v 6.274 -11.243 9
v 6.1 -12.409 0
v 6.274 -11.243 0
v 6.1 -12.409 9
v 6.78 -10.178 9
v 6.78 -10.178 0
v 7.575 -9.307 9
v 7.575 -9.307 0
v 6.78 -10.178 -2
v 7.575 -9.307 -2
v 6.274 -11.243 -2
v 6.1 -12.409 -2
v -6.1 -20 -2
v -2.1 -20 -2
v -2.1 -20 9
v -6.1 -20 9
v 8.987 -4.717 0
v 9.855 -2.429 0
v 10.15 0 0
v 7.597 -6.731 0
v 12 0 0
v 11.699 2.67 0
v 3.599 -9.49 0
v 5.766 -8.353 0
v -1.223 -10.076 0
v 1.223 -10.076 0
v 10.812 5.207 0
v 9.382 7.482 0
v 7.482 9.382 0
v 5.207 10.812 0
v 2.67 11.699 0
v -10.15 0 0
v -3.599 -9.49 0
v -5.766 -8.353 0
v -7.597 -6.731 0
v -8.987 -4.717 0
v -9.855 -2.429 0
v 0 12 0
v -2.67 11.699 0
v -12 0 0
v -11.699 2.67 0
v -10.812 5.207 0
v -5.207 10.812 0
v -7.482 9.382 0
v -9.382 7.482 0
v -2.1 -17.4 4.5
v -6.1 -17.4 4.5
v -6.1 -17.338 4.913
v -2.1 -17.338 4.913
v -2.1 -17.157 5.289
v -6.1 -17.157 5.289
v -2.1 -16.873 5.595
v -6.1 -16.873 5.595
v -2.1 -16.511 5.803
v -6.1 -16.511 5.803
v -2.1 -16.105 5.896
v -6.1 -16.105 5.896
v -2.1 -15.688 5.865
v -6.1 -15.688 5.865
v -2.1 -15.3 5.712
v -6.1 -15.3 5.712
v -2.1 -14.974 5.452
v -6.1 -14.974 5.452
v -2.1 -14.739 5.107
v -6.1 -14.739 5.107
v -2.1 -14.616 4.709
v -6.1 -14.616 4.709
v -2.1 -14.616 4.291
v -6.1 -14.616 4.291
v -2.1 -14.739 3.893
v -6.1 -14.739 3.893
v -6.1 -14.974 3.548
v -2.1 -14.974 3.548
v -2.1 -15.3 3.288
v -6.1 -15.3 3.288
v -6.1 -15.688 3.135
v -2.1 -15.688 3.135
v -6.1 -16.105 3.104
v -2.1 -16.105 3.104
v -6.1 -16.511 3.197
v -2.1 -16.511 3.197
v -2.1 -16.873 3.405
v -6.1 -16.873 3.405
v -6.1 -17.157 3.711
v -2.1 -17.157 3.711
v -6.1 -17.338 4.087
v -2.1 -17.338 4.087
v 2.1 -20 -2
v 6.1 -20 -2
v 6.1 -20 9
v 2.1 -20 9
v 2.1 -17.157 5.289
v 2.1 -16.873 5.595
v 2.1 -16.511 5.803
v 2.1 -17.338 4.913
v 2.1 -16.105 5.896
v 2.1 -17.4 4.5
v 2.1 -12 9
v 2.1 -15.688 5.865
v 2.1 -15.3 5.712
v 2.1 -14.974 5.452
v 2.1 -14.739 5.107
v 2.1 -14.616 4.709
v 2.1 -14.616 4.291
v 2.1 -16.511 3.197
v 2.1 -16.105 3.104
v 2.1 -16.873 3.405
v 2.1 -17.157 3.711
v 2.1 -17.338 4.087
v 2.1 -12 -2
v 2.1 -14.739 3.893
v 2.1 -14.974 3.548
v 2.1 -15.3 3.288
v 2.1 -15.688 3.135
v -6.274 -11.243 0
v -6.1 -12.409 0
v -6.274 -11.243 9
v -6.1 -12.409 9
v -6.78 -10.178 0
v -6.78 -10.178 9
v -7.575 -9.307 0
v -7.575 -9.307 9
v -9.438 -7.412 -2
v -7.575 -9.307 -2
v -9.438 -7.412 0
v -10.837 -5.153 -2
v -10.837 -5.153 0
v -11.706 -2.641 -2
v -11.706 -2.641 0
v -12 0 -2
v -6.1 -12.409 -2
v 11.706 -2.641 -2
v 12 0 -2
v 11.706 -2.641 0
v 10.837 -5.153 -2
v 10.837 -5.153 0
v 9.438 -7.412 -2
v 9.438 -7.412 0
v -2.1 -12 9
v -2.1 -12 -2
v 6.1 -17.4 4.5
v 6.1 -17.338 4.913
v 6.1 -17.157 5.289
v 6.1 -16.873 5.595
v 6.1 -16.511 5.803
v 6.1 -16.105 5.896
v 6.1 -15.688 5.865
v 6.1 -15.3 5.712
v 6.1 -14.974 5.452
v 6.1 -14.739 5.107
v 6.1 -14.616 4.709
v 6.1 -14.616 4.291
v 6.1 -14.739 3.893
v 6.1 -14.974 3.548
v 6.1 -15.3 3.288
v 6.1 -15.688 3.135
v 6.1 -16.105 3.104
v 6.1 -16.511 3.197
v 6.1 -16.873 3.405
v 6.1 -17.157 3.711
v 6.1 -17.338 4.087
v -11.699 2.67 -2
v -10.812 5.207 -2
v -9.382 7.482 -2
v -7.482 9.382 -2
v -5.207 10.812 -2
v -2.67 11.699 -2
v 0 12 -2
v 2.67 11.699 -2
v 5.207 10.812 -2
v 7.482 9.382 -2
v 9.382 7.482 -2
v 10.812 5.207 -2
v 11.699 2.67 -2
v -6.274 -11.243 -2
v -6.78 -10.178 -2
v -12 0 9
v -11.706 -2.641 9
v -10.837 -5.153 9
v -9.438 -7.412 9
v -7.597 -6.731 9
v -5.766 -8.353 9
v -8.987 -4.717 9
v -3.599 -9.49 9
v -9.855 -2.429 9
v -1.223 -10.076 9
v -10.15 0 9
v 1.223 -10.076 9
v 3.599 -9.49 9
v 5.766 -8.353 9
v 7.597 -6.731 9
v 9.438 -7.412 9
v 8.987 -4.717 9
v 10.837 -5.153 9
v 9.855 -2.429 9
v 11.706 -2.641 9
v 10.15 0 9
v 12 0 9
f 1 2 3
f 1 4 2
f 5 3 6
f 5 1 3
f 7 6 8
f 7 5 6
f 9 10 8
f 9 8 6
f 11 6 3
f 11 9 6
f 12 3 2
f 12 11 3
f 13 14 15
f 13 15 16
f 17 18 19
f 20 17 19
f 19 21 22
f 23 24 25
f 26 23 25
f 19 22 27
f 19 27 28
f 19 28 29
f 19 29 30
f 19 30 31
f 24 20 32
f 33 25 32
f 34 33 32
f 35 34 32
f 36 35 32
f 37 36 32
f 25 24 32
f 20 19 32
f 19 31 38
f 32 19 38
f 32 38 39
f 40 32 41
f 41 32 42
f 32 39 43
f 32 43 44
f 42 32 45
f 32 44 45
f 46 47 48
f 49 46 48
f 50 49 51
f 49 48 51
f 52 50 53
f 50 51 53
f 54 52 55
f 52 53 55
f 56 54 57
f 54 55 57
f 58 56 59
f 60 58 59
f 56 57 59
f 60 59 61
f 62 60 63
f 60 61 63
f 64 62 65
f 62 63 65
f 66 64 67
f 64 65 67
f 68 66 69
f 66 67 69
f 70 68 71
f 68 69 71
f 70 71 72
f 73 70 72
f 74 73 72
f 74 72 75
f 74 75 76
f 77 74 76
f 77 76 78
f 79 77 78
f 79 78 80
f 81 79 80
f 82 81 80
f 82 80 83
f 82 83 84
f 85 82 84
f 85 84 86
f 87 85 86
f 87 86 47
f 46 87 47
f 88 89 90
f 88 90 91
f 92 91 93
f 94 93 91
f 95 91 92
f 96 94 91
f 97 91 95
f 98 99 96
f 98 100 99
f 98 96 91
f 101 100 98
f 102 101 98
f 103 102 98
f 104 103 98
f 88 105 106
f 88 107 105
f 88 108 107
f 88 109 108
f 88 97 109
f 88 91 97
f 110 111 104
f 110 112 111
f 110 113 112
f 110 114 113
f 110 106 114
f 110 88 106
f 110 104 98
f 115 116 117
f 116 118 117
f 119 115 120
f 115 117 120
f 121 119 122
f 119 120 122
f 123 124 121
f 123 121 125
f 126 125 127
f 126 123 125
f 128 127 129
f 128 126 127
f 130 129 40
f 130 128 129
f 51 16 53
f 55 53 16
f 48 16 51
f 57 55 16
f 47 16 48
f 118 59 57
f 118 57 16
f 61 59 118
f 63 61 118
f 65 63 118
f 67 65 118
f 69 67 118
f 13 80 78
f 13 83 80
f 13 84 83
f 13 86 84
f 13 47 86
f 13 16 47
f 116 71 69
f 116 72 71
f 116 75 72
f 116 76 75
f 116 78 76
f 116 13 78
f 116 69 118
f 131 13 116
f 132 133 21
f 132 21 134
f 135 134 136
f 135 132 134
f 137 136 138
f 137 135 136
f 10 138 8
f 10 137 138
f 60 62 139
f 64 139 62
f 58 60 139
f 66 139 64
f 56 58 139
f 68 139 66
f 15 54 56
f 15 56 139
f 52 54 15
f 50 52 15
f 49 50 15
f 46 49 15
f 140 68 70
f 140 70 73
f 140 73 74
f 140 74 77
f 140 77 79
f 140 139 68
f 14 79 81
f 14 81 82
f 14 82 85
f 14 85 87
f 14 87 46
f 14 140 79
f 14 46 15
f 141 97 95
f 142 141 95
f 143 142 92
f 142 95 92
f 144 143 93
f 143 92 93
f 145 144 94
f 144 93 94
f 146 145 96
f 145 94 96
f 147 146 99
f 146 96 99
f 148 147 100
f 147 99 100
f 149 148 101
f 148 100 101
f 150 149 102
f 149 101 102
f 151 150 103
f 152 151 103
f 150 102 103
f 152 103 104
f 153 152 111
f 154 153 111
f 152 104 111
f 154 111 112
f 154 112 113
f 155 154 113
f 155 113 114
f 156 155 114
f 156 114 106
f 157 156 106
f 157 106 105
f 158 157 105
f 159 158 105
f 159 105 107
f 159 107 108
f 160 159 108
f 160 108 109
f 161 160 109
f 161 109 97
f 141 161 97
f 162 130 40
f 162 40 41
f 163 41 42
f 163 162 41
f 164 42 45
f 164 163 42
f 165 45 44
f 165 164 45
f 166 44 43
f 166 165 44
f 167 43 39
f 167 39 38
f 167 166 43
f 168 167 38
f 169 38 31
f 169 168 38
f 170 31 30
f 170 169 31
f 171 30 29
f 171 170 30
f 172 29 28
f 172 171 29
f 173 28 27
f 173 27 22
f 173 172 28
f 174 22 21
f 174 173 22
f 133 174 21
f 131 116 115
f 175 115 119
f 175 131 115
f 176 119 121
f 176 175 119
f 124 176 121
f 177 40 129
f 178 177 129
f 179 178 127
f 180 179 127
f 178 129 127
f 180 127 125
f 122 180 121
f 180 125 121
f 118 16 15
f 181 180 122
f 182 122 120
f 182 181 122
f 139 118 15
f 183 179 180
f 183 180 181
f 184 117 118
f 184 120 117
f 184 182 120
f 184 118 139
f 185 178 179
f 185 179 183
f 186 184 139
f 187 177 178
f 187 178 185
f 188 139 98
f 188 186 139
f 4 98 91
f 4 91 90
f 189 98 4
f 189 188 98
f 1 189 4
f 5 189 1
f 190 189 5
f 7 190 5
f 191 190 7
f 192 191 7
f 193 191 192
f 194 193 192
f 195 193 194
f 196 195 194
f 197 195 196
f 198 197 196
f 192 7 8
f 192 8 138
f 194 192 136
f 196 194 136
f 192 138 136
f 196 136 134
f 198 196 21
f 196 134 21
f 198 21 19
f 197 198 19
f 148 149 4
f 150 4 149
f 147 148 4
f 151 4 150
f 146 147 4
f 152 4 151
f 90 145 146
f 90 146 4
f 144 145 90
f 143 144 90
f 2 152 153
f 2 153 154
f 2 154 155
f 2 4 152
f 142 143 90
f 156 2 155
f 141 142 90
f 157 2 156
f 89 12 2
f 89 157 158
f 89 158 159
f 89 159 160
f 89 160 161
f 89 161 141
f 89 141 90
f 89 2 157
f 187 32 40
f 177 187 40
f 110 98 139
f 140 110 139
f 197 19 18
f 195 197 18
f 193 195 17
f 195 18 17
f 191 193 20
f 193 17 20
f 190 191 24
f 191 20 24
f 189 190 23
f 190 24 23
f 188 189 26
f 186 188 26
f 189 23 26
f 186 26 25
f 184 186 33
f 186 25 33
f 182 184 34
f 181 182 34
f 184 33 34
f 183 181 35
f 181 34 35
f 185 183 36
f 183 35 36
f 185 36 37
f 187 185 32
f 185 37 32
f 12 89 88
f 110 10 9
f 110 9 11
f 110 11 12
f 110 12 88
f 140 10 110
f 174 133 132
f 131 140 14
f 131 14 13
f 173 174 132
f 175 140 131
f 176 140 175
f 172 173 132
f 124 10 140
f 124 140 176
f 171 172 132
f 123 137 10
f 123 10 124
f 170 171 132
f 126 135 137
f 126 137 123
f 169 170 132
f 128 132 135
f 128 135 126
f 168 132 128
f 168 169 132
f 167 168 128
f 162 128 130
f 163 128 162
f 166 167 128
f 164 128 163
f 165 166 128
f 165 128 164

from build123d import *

# Parameters (mm, degrees)
EXTRUDE_1_DEPTH     = 9
SKETCH_3_R          = 1.4
CUT_EXTRUDE_1_DEPTH = 29.436068645
FILLET_1_R          = 4
EXTRUDE_START       = 2
EXTRUDE_2_DEPTH     = 2


with BuildPart() as part:
    # 草图1 → 凸台-拉伸1 (new body)
    with BuildSketch(Plane.XY):
        with BuildLine():
            Line((-6.1, -20), (-2.1, -20))
            Line((-2.1, -20), (-2.1, -12))
            Line((-2.1, -12), (2.1, -12))
            Line((2.1, -12), (2.1, -20))
            Line((2.1, -20), (6.1, -20))
            Line((6.1, -20), (6.1, -10.333924714))
            ThreePointArc((6.1, -10.333924714), (10.421132376, -5.949789912), (12, 0))
            Line((12, 0), (10.15, 0))
            ThreePointArc((10.15, 0), (0, -10.15), (-10.15, 0))
            Line((-10.15, 0), (-12, 0))
            ThreePointArc((-12, 0), (-10.421132376, -5.949789912), (-6.1, -10.333924714))
            Line((-6.1, -10.333924714), (-6.1, -20))
        make_face()
    extrude(amount=EXTRUDE_1_DEPTH)

    # 草图3 → 切除-拉伸1 (cut, through all)
    with BuildSketch(Plane.ZY.offset(6.1)):
        with Locations(Location((4.5, -16, 0), (0, 0, 270))):
            Circle(SKETCH_3_R)
    extrude(amount=-CUT_EXTRUDE_1_DEPTH, mode=Mode.SUBTRACT)

    # 圆角1
    fillet_1_edges = [part.edges().sort_by_distance(p)[0] for p in [
        (-6.1, -10.333924714, 4.5),
        (6.1, -10.333924714, 4.5),
    ]]
    fillet(fillet_1_edges, radius=FILLET_1_R)

    # 草图4 → 凸台-拉伸2 (add)
    with BuildSketch(Plane(origin=(0, 0, 0), x_dir=(-1, 0, 0), z_dir=(0, 0, -1)).offset(EXTRUDE_START)):
        with BuildLine():
            ThreePointArc((12, 0), (0, 12), (-12, 0))
            Line((-12, 0), (-10.15, 0))
            ThreePointArc((-10.15, 0), (0, -10.15), (10.15, 0))
            Line((10.15, 0), (12, 0))
        make_face()
        with BuildLine():
            Line((-2.1, -20), (-2.1, -12))
            Line((-2.1, -12), (2.1, -12))
            Line((2.1, -12), (2.1, -20))
            Line((2.1, -20), (6.1, -20))
            Line((6.1, -20), (6.1, -12.409270728))
            ThreePointArc((6.1, -12.409270728), (6.487521626, -10.691714324), (7.575, -9.306953046))
            ThreePointArc((7.575, -9.306953046), (10.837435121, -5.152669211), (12, 0))
            Line((12, 0), (10.15, 0))
            ThreePointArc((10.15, 0), (0, -10.15), (-10.15, 0))
            Line((-10.15, 0), (-12, 0))
            ThreePointArc((-12, 0), (-10.837435121, -5.152669211), (-7.575, -9.306953046))
            ThreePointArc((-7.575, -9.306953046), (-6.487521626, -10.691714324), (-6.1, -12.409270728))
            Line((-6.1, -12.409270728), (-6.1, -20))
            Line((-6.1, -20), (-2.1, -20))
        make_face()
    extrude(amount=-EXTRUDE_2_DEPTH)


solid = part.part
